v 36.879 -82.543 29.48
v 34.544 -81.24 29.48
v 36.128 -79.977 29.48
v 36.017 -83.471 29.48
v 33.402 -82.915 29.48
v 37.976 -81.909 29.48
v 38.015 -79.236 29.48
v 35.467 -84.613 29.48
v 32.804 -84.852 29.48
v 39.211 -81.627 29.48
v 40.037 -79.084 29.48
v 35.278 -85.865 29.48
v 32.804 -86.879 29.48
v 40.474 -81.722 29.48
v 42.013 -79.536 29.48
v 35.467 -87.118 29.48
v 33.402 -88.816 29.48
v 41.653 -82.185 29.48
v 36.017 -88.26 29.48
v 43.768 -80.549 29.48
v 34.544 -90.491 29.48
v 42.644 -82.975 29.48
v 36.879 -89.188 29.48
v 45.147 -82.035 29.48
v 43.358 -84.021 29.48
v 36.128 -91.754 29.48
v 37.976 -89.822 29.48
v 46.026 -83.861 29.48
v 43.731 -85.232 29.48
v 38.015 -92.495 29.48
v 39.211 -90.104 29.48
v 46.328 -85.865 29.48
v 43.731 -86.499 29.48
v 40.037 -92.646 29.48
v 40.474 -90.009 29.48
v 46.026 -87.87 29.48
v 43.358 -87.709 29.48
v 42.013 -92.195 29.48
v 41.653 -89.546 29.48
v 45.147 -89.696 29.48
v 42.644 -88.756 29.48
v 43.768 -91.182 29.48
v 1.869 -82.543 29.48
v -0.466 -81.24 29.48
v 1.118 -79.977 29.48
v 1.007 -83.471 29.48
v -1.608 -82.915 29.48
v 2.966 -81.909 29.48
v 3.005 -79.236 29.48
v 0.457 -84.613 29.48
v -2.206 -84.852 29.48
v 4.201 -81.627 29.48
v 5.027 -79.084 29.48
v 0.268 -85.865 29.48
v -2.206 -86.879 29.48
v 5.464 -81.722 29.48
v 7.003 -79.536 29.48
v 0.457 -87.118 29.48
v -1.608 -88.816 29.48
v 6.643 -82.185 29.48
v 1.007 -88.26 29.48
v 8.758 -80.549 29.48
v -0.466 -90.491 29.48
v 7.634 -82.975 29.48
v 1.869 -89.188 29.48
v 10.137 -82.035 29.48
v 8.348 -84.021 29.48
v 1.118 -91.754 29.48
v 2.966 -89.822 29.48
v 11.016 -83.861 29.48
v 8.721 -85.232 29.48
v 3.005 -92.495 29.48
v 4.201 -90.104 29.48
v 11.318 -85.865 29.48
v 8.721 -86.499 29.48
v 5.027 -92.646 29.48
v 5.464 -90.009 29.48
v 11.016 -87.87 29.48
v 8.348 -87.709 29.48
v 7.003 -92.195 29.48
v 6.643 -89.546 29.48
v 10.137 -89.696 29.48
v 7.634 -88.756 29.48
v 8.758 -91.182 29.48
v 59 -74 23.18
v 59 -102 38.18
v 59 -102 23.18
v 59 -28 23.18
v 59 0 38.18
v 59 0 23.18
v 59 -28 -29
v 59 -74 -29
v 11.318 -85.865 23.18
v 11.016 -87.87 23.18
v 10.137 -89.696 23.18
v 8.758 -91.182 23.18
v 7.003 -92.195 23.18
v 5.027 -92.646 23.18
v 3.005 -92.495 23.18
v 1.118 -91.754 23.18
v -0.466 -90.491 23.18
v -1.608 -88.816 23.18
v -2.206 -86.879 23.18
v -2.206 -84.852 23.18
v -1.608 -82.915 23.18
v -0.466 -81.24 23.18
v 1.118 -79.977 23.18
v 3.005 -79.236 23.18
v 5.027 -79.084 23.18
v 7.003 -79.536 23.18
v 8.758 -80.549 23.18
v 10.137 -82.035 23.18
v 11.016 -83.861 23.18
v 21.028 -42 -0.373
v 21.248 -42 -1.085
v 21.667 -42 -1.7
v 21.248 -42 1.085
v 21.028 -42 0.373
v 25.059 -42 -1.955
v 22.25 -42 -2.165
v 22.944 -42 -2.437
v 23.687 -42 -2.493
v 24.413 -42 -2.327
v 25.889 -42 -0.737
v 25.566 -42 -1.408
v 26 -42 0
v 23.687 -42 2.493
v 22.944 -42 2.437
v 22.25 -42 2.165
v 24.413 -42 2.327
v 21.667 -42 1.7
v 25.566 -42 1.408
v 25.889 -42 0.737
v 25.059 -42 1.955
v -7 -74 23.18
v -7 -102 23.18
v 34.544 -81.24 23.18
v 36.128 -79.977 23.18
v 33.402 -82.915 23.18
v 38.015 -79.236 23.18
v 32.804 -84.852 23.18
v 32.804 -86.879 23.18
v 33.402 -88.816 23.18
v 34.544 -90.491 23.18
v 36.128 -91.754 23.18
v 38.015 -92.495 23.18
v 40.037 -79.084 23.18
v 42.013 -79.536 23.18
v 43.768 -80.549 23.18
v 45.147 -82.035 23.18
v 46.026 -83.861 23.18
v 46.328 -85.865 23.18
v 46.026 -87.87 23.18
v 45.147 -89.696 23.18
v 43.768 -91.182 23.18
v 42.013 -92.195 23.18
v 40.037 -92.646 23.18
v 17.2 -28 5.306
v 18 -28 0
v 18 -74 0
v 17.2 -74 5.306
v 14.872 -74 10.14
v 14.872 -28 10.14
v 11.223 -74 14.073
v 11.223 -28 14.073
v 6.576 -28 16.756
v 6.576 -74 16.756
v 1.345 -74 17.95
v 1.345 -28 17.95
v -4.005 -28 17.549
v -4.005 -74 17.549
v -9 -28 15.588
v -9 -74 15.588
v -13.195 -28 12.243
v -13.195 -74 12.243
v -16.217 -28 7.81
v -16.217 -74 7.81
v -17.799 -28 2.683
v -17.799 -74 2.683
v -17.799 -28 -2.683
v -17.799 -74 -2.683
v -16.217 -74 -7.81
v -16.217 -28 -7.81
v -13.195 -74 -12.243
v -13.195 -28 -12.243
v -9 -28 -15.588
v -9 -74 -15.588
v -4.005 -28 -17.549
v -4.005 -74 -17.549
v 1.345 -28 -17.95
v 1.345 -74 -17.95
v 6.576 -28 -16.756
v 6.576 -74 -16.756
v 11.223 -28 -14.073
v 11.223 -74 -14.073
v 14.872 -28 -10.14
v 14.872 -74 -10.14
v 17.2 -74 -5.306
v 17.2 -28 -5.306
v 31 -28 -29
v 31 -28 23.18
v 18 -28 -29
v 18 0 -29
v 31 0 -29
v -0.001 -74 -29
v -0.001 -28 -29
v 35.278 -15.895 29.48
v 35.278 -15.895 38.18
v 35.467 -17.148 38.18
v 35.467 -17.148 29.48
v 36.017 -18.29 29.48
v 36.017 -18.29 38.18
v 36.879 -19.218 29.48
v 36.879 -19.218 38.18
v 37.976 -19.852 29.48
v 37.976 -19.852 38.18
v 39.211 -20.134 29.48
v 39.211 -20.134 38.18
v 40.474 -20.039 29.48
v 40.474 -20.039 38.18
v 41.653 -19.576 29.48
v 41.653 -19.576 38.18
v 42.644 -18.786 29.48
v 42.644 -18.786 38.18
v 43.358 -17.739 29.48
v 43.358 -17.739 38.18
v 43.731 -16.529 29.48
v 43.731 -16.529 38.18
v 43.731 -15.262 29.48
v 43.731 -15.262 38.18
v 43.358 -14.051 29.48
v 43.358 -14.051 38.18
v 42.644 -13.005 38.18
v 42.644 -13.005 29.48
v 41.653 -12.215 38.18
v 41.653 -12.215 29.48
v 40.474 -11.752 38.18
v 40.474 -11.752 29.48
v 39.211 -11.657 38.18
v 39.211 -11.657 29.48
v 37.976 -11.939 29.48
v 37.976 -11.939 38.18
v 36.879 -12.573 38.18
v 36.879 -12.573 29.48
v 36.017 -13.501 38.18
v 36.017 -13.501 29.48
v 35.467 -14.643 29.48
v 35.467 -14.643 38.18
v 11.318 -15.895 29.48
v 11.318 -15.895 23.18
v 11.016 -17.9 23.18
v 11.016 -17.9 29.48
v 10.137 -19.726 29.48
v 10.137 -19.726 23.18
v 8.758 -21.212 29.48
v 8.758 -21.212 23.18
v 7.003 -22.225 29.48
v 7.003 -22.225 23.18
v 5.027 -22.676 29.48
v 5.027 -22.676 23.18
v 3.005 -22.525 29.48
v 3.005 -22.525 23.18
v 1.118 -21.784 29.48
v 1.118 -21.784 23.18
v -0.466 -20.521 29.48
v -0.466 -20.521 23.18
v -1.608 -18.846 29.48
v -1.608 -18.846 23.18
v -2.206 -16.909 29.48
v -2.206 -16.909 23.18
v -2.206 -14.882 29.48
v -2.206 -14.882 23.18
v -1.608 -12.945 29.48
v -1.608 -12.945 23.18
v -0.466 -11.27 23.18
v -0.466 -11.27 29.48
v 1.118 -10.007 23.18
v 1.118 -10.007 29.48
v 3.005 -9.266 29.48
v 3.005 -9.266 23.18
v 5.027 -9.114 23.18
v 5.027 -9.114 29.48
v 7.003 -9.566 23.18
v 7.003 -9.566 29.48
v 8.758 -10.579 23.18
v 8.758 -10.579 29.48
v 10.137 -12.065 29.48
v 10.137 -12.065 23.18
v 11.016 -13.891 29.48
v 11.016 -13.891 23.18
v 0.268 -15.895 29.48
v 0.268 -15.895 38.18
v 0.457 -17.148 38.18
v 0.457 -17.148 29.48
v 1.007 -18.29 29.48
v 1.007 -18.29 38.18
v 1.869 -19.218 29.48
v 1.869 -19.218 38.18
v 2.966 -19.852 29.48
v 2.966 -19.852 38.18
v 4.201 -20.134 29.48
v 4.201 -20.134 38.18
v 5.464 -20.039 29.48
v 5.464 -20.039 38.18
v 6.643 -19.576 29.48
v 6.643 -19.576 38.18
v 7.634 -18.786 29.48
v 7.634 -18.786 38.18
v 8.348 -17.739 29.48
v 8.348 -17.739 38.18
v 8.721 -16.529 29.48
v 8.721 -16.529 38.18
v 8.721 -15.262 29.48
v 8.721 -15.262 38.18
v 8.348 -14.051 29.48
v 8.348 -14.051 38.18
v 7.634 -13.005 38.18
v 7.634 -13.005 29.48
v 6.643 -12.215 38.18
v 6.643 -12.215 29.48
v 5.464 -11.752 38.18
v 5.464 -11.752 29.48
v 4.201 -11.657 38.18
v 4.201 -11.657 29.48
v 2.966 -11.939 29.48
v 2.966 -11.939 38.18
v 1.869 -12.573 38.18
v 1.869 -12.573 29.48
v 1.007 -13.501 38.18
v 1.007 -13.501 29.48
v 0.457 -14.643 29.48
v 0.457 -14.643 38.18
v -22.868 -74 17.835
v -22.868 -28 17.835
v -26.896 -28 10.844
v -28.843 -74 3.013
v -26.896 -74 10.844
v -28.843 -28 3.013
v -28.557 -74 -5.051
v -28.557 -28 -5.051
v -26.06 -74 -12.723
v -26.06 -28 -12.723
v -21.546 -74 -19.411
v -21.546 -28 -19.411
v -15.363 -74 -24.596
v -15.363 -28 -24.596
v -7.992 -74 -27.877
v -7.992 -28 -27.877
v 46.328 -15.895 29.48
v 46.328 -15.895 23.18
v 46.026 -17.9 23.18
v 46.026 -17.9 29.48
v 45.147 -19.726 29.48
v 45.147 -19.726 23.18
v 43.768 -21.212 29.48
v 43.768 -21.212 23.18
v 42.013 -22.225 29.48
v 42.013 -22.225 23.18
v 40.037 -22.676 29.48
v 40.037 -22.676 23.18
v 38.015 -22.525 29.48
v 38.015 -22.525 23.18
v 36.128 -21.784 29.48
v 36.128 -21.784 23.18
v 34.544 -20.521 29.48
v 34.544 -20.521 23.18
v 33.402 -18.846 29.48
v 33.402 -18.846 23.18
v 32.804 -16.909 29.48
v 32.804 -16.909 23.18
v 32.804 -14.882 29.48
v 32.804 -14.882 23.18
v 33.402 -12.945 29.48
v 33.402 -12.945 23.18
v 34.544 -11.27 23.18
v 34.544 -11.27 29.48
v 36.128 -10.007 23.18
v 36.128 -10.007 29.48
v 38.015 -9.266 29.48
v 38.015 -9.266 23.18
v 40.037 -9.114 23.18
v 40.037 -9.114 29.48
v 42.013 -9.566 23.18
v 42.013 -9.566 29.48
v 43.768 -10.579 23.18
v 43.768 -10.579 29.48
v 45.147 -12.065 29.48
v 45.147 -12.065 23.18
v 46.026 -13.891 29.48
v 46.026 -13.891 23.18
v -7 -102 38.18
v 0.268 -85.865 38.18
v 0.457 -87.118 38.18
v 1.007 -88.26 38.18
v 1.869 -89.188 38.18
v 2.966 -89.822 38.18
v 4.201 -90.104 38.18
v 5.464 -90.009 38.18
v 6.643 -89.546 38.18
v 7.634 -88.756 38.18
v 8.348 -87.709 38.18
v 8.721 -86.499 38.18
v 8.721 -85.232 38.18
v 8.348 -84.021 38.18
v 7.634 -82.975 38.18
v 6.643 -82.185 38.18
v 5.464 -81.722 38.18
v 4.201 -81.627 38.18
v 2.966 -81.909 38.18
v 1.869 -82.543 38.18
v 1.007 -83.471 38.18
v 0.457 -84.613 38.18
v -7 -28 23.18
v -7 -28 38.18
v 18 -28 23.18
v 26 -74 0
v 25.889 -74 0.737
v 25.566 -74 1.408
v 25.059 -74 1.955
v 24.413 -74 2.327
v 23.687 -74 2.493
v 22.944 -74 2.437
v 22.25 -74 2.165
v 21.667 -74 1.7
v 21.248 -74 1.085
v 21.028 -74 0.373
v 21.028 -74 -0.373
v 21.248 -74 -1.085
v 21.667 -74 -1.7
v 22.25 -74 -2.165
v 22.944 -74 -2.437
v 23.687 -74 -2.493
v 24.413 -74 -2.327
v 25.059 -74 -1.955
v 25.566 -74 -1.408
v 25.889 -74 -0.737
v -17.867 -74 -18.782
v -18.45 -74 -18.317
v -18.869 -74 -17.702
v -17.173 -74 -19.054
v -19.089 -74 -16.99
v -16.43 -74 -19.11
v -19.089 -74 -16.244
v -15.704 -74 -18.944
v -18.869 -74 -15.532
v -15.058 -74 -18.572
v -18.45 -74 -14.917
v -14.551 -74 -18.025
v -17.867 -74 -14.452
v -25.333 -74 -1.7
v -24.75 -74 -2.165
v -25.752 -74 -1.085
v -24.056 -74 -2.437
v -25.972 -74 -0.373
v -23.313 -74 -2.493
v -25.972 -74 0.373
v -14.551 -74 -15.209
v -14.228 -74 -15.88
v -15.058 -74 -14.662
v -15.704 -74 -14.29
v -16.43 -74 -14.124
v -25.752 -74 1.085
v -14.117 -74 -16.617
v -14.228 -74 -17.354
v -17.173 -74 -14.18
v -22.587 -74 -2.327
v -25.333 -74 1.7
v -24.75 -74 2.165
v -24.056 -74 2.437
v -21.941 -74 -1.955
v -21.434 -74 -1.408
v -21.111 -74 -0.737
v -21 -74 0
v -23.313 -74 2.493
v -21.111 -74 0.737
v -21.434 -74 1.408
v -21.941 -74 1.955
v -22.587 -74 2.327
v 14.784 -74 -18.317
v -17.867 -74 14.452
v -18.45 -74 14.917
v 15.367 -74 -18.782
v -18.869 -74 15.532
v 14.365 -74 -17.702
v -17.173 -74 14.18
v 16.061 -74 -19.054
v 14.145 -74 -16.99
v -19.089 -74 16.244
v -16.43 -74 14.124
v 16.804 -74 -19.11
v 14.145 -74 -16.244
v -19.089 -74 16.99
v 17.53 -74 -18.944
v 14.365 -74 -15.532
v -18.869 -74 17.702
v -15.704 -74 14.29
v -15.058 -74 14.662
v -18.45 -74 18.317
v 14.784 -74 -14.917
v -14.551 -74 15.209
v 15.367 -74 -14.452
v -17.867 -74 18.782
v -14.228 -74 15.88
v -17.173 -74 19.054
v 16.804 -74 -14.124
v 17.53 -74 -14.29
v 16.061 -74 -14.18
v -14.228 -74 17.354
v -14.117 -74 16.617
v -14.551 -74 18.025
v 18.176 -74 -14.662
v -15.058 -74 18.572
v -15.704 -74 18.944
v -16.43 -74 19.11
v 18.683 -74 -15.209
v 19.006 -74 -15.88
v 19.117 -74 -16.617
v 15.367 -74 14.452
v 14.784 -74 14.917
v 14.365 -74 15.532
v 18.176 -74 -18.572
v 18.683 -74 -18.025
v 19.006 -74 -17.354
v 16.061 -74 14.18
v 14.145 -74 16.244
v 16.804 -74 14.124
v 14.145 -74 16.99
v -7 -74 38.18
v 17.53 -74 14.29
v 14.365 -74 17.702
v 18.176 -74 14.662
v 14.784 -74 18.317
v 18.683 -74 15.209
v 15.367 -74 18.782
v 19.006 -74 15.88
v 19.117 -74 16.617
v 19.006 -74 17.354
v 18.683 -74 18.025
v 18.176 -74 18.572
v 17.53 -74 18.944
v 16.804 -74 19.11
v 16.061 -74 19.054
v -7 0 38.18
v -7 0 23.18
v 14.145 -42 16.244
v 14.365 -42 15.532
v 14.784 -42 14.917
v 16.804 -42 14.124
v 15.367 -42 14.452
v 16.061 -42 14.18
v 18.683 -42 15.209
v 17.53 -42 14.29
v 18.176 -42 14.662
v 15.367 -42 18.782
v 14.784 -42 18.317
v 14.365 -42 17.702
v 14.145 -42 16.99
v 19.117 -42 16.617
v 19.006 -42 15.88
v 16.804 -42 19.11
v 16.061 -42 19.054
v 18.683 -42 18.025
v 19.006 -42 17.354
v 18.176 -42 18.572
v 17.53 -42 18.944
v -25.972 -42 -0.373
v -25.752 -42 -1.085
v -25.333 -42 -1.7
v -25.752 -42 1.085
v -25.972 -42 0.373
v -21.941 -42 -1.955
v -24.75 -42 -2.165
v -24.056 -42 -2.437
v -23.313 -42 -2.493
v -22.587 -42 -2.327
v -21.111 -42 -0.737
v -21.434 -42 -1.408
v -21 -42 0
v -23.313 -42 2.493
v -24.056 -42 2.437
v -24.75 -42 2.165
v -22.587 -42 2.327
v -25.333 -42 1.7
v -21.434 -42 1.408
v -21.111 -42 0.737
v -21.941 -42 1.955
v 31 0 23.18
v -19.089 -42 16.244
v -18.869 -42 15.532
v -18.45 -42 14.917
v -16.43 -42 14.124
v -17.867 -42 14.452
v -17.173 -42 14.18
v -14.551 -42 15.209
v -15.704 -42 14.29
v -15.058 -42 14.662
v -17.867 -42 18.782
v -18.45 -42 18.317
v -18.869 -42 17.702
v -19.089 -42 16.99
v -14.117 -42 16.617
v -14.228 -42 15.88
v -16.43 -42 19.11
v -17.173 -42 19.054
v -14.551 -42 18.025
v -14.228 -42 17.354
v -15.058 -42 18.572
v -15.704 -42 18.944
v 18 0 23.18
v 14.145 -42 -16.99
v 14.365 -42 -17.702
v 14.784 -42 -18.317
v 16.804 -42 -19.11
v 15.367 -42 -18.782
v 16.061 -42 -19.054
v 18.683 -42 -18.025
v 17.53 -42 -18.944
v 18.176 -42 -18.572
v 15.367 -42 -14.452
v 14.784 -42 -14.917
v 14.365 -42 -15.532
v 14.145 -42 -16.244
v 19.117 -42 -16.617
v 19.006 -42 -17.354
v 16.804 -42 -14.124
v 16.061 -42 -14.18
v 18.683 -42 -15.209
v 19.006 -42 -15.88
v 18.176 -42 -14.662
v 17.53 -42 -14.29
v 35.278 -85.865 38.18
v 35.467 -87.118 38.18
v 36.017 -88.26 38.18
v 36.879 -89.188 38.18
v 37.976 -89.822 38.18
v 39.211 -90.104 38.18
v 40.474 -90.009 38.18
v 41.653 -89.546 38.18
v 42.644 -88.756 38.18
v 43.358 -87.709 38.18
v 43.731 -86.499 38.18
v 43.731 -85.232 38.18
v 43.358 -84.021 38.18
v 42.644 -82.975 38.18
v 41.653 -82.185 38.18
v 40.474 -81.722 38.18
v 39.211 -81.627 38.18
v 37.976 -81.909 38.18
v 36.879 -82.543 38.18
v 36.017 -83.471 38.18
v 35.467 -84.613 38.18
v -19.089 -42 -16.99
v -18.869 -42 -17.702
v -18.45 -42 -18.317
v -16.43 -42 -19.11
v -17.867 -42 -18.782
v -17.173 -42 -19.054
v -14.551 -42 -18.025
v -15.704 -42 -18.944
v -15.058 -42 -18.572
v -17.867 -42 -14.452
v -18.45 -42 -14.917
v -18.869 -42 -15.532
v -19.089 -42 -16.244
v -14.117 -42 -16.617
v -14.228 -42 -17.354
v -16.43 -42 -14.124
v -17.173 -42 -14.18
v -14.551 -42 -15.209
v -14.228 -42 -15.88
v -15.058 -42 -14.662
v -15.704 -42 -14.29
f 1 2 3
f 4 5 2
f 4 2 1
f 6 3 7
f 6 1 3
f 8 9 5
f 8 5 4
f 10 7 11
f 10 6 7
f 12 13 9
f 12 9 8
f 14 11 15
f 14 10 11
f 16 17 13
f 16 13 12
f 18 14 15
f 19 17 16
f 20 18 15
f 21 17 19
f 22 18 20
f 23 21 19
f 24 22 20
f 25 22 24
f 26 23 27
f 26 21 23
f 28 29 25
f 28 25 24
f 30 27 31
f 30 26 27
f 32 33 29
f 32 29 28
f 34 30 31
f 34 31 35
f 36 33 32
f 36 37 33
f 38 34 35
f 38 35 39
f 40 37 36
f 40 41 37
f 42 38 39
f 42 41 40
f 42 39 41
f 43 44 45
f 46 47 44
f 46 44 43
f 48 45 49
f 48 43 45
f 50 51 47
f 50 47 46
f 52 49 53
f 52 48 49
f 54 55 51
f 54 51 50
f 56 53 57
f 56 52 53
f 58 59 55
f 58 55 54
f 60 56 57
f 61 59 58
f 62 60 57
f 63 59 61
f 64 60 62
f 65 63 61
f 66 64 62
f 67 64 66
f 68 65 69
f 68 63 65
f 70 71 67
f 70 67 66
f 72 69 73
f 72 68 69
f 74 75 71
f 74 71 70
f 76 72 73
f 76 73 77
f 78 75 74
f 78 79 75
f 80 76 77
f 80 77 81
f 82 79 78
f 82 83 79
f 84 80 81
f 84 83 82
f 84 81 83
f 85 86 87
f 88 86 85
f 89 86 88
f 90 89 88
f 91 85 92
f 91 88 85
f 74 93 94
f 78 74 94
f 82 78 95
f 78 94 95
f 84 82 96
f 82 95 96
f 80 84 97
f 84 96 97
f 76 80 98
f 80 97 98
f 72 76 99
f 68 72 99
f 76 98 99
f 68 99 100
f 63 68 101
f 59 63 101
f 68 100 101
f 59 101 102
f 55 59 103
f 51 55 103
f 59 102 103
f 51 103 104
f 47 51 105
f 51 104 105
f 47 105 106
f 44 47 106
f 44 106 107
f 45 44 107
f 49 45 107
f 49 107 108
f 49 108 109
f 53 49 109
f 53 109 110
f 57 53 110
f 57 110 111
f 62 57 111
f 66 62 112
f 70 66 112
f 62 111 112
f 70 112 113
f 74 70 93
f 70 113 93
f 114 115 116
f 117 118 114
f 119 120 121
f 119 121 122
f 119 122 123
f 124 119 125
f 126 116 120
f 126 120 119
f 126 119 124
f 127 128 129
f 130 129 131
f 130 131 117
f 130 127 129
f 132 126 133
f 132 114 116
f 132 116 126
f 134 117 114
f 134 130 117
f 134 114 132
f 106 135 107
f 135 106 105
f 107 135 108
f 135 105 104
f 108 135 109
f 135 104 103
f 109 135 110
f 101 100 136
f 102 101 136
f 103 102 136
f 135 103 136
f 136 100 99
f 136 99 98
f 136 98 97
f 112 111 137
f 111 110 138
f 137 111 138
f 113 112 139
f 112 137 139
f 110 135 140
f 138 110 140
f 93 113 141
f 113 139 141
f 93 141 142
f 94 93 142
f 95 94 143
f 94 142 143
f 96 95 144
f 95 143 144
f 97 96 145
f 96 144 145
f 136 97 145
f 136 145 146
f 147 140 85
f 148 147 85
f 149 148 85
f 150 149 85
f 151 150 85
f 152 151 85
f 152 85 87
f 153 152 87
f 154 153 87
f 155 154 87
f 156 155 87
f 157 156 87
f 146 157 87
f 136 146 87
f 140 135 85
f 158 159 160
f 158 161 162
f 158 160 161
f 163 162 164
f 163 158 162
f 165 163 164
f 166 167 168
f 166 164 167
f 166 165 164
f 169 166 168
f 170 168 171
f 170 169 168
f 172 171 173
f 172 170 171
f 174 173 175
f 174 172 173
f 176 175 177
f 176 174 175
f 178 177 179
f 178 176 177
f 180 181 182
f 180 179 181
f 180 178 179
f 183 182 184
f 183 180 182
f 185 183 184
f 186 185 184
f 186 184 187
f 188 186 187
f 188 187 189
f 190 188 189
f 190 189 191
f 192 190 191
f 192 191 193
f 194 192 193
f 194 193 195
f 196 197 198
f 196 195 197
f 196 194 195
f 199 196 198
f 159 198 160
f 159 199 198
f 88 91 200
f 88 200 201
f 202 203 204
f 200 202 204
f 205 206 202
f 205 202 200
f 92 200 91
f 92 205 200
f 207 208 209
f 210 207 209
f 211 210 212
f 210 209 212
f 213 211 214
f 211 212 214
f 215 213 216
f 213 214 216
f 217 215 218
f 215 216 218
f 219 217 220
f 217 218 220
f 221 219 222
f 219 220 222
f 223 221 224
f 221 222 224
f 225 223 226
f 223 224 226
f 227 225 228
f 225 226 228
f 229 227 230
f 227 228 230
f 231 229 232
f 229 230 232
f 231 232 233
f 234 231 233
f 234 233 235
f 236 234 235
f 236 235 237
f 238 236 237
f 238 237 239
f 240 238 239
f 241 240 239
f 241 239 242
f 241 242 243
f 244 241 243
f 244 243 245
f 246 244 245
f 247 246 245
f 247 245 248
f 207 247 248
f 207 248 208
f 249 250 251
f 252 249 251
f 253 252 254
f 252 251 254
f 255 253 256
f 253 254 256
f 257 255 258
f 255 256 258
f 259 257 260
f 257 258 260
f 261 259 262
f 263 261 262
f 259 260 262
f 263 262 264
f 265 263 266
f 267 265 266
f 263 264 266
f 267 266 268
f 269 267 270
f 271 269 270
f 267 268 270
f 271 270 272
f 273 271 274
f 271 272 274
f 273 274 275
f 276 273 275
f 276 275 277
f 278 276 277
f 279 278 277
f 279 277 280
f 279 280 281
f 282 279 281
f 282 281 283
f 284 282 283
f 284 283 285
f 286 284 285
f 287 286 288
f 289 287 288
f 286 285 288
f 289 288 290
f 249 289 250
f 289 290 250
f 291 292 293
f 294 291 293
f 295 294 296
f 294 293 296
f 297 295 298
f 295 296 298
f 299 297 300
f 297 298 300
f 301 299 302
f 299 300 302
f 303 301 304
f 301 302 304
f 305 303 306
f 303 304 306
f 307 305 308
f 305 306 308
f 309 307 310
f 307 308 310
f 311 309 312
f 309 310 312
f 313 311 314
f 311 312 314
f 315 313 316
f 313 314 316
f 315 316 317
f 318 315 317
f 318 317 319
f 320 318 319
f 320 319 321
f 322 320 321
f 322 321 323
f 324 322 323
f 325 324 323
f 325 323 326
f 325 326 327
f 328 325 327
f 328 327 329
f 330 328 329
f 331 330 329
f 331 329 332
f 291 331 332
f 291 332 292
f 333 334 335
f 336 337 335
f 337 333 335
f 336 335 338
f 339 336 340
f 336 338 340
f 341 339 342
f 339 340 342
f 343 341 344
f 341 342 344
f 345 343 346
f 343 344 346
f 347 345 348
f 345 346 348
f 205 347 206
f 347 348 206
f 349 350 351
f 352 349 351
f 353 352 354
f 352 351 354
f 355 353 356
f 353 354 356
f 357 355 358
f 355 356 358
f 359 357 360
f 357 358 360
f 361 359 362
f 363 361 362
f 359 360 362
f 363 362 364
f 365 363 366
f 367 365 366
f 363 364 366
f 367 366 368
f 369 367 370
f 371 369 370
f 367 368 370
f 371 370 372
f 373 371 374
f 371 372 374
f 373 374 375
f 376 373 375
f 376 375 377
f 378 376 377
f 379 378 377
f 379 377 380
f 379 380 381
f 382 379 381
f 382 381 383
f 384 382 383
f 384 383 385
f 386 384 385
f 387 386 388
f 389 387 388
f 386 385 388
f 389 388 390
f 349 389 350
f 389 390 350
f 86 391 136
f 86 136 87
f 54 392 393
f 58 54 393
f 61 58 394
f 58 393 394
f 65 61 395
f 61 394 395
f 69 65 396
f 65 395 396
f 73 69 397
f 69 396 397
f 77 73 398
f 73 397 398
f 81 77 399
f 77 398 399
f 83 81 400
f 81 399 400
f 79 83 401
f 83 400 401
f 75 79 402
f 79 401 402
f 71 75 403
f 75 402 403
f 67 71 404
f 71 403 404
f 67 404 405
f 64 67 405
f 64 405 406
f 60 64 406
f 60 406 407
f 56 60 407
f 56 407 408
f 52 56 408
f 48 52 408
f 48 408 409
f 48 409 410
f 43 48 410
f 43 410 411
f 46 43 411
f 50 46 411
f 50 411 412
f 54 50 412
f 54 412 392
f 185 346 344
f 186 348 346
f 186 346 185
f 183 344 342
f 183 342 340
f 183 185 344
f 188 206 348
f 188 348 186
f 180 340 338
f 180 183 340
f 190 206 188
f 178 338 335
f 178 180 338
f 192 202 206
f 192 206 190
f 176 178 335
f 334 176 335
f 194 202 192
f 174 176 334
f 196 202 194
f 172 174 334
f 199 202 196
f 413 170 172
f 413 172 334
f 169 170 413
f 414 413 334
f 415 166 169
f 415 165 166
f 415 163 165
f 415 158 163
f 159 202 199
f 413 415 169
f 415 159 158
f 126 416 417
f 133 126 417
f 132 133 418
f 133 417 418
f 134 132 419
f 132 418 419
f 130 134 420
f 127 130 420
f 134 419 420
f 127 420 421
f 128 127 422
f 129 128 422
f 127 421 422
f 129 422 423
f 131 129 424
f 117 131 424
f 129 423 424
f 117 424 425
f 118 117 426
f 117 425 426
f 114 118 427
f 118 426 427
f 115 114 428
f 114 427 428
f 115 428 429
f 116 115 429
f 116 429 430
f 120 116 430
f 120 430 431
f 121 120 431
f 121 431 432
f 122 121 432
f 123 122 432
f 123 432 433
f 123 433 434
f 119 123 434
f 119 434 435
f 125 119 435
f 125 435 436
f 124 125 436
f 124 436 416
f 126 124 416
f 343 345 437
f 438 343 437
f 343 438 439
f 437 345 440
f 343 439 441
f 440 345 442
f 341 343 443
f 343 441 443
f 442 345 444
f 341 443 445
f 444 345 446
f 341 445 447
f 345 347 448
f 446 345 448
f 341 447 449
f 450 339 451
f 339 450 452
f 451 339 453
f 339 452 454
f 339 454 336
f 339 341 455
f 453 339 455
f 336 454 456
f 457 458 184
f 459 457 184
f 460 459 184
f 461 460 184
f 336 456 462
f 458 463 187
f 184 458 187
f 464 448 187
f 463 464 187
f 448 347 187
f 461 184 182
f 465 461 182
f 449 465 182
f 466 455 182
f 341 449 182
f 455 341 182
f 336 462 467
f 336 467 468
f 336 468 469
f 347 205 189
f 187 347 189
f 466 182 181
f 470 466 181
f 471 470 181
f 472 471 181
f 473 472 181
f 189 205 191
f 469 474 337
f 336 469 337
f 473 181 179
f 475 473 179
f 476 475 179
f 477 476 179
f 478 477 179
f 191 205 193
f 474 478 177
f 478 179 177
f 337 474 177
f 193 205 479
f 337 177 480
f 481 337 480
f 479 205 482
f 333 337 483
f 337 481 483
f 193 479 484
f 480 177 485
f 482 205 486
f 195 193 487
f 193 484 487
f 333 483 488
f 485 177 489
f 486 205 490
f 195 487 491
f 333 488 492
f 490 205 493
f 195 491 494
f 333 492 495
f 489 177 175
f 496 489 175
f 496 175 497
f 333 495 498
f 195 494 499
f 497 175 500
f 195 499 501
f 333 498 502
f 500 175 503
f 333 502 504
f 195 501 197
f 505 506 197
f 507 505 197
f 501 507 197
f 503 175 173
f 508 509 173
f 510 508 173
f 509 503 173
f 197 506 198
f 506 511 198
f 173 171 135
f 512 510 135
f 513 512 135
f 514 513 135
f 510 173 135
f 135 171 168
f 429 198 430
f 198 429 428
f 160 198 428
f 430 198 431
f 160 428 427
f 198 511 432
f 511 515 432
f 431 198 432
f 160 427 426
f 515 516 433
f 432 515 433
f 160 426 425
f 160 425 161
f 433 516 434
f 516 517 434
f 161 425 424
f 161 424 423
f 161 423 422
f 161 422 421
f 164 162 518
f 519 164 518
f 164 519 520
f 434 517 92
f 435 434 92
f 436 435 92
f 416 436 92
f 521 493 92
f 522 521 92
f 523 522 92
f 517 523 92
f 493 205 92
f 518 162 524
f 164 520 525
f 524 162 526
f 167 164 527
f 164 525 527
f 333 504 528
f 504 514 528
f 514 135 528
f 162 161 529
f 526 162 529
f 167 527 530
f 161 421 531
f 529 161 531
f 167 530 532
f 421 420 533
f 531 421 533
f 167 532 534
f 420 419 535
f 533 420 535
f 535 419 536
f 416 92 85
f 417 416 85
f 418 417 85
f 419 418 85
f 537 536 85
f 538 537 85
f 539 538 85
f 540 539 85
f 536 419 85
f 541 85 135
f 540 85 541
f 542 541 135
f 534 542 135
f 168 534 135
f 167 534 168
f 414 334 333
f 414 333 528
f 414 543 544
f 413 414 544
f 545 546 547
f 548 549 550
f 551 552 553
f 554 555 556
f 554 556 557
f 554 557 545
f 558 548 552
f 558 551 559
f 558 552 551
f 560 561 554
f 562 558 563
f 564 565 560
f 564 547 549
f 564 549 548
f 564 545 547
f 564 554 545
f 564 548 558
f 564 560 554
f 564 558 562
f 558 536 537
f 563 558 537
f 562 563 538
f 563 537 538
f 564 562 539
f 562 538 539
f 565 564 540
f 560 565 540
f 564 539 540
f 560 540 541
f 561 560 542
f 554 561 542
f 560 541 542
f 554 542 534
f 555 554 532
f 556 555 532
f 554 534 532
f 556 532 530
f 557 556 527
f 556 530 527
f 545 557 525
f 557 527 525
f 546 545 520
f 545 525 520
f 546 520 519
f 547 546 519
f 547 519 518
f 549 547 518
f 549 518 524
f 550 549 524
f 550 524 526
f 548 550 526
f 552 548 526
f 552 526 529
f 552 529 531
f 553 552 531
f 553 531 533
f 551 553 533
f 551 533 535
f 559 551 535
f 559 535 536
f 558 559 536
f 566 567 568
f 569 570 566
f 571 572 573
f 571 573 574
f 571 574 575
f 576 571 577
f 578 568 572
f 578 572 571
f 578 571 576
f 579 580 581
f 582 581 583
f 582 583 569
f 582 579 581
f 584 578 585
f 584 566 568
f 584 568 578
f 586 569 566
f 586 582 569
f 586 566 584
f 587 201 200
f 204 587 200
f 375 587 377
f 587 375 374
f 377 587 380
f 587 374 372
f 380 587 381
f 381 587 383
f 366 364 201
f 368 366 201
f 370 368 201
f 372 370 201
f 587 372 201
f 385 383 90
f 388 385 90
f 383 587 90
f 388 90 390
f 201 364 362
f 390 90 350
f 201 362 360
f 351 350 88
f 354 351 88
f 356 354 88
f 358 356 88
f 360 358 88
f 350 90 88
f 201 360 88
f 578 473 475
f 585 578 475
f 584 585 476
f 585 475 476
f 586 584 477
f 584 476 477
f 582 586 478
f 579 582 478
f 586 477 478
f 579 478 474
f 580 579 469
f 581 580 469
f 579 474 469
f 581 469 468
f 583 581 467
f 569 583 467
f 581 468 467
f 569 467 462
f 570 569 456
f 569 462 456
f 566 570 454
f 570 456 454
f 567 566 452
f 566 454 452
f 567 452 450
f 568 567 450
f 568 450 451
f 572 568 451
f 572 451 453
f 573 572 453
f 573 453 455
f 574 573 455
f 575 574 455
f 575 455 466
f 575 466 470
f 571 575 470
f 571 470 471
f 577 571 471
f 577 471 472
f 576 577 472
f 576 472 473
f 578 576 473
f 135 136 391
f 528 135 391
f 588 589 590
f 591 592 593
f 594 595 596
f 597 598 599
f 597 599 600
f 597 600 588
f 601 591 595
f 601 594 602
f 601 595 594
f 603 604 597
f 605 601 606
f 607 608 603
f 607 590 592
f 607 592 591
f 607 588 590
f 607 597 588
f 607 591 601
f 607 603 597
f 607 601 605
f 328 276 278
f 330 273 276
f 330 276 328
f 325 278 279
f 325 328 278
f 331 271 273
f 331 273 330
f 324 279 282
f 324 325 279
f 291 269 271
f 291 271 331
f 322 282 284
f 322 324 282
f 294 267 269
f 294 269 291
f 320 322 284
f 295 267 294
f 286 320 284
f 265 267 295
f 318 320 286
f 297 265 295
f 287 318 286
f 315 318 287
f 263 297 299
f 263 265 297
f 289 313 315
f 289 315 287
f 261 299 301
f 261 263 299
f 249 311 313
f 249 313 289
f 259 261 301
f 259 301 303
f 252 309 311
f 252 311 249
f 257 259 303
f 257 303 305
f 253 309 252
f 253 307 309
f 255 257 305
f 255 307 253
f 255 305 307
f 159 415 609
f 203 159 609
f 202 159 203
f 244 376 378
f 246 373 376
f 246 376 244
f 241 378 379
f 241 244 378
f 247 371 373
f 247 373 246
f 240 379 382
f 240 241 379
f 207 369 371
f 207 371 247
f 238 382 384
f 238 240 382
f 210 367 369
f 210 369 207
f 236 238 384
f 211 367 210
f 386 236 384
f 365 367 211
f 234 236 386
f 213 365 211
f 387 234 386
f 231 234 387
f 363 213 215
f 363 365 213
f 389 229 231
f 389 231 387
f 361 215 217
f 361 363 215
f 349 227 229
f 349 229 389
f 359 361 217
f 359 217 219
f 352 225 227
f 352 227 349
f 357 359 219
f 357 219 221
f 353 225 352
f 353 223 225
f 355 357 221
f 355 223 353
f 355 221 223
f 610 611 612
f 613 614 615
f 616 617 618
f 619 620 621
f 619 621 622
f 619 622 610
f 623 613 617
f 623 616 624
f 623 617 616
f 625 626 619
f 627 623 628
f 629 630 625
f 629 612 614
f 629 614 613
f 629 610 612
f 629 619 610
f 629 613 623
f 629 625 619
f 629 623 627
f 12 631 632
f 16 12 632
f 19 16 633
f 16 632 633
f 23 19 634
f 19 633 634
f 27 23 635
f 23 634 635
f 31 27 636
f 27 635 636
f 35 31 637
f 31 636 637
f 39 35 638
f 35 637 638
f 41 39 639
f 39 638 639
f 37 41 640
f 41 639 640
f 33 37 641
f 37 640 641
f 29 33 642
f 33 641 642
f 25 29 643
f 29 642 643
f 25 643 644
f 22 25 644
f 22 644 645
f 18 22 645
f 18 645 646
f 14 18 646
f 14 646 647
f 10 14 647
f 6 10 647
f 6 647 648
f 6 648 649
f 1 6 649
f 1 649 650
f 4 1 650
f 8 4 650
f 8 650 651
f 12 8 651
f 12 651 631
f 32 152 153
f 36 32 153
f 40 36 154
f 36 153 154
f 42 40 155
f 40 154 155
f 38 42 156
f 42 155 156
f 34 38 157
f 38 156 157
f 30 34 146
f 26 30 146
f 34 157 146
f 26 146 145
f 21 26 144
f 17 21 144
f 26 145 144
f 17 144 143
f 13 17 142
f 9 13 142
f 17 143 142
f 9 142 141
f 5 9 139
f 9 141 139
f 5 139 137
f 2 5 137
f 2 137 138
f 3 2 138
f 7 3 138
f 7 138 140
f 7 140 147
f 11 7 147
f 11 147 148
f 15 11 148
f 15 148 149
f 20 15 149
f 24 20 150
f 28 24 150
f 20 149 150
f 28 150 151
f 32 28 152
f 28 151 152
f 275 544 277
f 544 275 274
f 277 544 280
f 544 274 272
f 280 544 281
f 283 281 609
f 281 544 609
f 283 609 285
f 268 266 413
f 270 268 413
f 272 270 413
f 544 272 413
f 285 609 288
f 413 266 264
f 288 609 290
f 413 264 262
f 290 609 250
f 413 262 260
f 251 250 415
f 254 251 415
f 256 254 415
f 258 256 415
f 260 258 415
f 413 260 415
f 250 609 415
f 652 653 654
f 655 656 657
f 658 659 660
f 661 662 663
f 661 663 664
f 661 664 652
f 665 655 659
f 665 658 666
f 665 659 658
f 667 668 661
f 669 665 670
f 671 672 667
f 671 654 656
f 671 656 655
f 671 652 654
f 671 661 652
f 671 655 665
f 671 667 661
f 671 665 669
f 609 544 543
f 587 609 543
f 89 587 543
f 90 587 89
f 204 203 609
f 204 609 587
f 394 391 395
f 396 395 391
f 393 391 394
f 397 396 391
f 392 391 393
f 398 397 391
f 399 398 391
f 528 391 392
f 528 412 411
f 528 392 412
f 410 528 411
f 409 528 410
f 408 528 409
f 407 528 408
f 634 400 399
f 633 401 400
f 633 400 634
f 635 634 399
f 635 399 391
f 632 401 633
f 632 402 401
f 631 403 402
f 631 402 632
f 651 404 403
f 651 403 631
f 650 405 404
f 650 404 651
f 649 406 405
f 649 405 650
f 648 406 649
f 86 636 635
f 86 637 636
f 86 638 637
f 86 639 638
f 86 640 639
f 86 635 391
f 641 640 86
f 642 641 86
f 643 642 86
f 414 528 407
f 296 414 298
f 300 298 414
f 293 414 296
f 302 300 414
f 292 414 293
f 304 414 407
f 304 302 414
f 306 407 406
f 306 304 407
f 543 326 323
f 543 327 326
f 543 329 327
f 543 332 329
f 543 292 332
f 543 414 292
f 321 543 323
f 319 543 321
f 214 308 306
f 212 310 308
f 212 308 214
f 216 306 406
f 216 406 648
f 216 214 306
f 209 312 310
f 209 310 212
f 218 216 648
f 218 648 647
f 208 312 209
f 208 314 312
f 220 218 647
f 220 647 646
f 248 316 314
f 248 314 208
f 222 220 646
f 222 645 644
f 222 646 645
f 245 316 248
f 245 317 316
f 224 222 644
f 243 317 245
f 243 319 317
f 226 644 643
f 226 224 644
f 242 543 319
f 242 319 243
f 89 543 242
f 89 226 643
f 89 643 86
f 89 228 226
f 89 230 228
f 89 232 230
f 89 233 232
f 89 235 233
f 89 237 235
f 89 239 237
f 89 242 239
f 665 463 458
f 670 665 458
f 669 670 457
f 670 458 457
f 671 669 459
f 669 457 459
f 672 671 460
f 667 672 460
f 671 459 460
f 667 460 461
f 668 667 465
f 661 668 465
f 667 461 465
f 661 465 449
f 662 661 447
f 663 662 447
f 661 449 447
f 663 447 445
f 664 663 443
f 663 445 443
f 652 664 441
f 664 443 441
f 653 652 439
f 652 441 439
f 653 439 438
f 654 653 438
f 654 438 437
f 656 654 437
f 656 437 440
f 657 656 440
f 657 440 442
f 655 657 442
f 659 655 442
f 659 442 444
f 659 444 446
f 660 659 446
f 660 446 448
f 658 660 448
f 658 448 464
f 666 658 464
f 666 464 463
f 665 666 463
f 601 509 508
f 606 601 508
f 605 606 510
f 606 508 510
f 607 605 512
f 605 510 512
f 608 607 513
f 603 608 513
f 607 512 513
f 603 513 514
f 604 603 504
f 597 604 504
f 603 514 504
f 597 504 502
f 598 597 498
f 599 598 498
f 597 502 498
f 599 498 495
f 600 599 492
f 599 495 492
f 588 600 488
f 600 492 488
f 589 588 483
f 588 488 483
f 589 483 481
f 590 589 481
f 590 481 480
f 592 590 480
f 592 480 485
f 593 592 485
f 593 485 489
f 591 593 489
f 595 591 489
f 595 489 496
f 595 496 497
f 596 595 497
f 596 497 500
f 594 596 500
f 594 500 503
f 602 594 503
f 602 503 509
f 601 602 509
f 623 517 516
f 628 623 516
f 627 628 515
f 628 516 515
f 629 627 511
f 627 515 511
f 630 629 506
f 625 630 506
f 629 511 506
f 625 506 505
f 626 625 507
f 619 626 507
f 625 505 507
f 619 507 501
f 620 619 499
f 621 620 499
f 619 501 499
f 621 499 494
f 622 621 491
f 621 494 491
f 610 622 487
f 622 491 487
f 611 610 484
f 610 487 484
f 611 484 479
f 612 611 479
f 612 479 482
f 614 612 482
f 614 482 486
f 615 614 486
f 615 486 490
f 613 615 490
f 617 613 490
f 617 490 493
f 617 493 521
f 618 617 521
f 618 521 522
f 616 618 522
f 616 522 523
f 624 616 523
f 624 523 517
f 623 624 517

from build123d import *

# Parameters (mm, degrees)
SKETCH_R        = 18
PAD_DEPTH       = 102
SKETCH001_R     = 2.5
POCKET_DEPTH    = 60
SKETCH002_W     = 52.1799999732
SKETCH002_H     = 28
POCKET001_DEPTH = 88.001
SKETCH003_R     = 4.25
POCKET002_DEPTH = 67.1809999732
SKETCH004_R     = 6.8
POCKET003_DEPTH = 6.3
SKETCH005_W     = 11.6986626704
SKETCH005_H     = 15
POCKET004_DEPTH = 28
SKETCH006_W     = 11.6986626704
SKETCH006_H     = 15
POCKET005_DEPTH = 28
SKETCH007_W     = 13
SKETCH007_H     = 52.1799999732
PAD001_DEPTH    = 28


with BuildPart() as part:
    # Sketch → Pad (new body)
    with BuildSketch(Plane.XZ):
        with BuildLine():
            ThreePointArc((-22.8675555461, 17.834654562), (-26.0598687385, -12.7233345209), (-0.0012478604, -28.9999999732))
            Line((-0.0012478604, -28.9999999732), (59, -28.9999999732))
            Line((59, 38.18), (59, -28.9999999732))
            Line((-7, 38.18), (59, 38.18))
            Line((-22.8675555461, 17.834654562), (-7, 38.18))
        make_face()
        Circle(SKETCH_R, mode=Mode.SUBTRACT)
    extrude(amount=PAD_DEPTH)

    # Sketch001 (on Face8 of Pad) → Pocket (cut)
    with BuildSketch(Plane.XZ.offset(102)):
        with Locations((-16.6170093579, 16.6170093579)):
            Circle(SKETCH001_R)
        with Locations((-23.5, 0)):
            Circle(SKETCH001_R)
        with Locations((-16.6170093579, -16.6170093579)):
            Circle(SKETCH001_R)
        with Locations((16.6170093579, -16.6170093579)):
            Circle(SKETCH001_R)
        with Locations((23.5, 0)):
            Circle(SKETCH001_R)
        with Locations((16.6170093579, 16.6170093579)):
            Circle(SKETCH001_R)
    extrude(amount=-POCKET_DEPTH, mode=Mode.SUBTRACT)

    # Sketch002 (on Face7 of Pocket) → Pocket001 (cut, through all)
    with BuildSketch(Plane(origin=(59, 0, 0), x_dir=(0, 0, 1), z_dir=(1, 0, 0))):
        with Locations((-2.9099999866, 88)):
            Rectangle(SKETCH002_W, SKETCH002_H)
        with Locations((-2.9099999866, 14)):
            Rectangle(SKETCH002_W, SKETCH002_H)
    extrude(amount=-POCKET001_DEPTH, mode=Mode.SUBTRACT)

    # Sketch003 (on Face17 of Pocket001) → Pocket002 (cut, through all)
    with BuildSketch(Plane(origin=(0, 0, 38.18), x_dir=(-1, 0, 0), z_dir=(0, 0, 1))):
        with Locations((-39.5284801247, 85.8654773551)):
            Circle(SKETCH003_R)
        with Locations((-4.5184801247, 85.8654773551)):
            Circle(SKETCH003_R)
        with Locations((-39.5284801247, 15.8954773551)):
            Circle(SKETCH003_R)
        with Locations((-4.5184801247, 15.8954773551)):
            Circle(SKETCH003_R)
    extrude(amount=-POCKET002_DEPTH, mode=Mode.SUBTRACT)

    # Sketch004 (on Face9 of Pocket002) → Pocket003 (cut)
    with BuildSketch(Plane(origin=(0, 0, 23.18), x_dir=(1, 0, 0), z_dir=(0, 0, -1))):
        with Locations((4.5184801247, 85.8654773551)):
            Circle(SKETCH004_R)
        with Locations((39.5284801247, 85.8654773551)):
            Circle(SKETCH004_R)
        with Locations((39.5284801247, 15.8954773551)):
            Circle(SKETCH004_R)
        with Locations((4.5184801247, 15.8954773551)):
            Circle(SKETCH004_R)
    extrude(amount=-POCKET003_DEPTH, mode=Mode.SUBTRACT)

    # Sketch005 (on Face18 of Pocket003) → Pocket004 (cut)
    with BuildSketch(Plane.XZ.offset(102)):
        with Locations((-12.8493313352, 30.68)):
            Rectangle(SKETCH005_W, SKETCH005_H)
    extrude(amount=-POCKET004_DEPTH, mode=Mode.SUBTRACT)

    # Sketch006 (on Face17 of Pocket004) → Pocket005 (cut)
    with BuildSketch(Plane(origin=(0, 0, 0), x_dir=(1, 0, 0), z_dir=(0, 1, 0))):
        with Locations((-12.8493313352, -30.68)):
            Rectangle(SKETCH006_W, SKETCH006_H)
    extrude(amount=-POCKET005_DEPTH, mode=Mode.SUBTRACT)

    # Sketch007 (on Face2 of Pocket005) → Pad001 (join)
    with BuildSketch(Plane(origin=(0, -28, 0), x_dir=(1, 0, 0), z_dir=(0, 1, 0))):
        with Locations((24.5, 2.9099999866)):
            Rectangle(SKETCH007_W, SKETCH007_H)
    extrude(amount=PAD001_DEPTH)


solid = part.part
